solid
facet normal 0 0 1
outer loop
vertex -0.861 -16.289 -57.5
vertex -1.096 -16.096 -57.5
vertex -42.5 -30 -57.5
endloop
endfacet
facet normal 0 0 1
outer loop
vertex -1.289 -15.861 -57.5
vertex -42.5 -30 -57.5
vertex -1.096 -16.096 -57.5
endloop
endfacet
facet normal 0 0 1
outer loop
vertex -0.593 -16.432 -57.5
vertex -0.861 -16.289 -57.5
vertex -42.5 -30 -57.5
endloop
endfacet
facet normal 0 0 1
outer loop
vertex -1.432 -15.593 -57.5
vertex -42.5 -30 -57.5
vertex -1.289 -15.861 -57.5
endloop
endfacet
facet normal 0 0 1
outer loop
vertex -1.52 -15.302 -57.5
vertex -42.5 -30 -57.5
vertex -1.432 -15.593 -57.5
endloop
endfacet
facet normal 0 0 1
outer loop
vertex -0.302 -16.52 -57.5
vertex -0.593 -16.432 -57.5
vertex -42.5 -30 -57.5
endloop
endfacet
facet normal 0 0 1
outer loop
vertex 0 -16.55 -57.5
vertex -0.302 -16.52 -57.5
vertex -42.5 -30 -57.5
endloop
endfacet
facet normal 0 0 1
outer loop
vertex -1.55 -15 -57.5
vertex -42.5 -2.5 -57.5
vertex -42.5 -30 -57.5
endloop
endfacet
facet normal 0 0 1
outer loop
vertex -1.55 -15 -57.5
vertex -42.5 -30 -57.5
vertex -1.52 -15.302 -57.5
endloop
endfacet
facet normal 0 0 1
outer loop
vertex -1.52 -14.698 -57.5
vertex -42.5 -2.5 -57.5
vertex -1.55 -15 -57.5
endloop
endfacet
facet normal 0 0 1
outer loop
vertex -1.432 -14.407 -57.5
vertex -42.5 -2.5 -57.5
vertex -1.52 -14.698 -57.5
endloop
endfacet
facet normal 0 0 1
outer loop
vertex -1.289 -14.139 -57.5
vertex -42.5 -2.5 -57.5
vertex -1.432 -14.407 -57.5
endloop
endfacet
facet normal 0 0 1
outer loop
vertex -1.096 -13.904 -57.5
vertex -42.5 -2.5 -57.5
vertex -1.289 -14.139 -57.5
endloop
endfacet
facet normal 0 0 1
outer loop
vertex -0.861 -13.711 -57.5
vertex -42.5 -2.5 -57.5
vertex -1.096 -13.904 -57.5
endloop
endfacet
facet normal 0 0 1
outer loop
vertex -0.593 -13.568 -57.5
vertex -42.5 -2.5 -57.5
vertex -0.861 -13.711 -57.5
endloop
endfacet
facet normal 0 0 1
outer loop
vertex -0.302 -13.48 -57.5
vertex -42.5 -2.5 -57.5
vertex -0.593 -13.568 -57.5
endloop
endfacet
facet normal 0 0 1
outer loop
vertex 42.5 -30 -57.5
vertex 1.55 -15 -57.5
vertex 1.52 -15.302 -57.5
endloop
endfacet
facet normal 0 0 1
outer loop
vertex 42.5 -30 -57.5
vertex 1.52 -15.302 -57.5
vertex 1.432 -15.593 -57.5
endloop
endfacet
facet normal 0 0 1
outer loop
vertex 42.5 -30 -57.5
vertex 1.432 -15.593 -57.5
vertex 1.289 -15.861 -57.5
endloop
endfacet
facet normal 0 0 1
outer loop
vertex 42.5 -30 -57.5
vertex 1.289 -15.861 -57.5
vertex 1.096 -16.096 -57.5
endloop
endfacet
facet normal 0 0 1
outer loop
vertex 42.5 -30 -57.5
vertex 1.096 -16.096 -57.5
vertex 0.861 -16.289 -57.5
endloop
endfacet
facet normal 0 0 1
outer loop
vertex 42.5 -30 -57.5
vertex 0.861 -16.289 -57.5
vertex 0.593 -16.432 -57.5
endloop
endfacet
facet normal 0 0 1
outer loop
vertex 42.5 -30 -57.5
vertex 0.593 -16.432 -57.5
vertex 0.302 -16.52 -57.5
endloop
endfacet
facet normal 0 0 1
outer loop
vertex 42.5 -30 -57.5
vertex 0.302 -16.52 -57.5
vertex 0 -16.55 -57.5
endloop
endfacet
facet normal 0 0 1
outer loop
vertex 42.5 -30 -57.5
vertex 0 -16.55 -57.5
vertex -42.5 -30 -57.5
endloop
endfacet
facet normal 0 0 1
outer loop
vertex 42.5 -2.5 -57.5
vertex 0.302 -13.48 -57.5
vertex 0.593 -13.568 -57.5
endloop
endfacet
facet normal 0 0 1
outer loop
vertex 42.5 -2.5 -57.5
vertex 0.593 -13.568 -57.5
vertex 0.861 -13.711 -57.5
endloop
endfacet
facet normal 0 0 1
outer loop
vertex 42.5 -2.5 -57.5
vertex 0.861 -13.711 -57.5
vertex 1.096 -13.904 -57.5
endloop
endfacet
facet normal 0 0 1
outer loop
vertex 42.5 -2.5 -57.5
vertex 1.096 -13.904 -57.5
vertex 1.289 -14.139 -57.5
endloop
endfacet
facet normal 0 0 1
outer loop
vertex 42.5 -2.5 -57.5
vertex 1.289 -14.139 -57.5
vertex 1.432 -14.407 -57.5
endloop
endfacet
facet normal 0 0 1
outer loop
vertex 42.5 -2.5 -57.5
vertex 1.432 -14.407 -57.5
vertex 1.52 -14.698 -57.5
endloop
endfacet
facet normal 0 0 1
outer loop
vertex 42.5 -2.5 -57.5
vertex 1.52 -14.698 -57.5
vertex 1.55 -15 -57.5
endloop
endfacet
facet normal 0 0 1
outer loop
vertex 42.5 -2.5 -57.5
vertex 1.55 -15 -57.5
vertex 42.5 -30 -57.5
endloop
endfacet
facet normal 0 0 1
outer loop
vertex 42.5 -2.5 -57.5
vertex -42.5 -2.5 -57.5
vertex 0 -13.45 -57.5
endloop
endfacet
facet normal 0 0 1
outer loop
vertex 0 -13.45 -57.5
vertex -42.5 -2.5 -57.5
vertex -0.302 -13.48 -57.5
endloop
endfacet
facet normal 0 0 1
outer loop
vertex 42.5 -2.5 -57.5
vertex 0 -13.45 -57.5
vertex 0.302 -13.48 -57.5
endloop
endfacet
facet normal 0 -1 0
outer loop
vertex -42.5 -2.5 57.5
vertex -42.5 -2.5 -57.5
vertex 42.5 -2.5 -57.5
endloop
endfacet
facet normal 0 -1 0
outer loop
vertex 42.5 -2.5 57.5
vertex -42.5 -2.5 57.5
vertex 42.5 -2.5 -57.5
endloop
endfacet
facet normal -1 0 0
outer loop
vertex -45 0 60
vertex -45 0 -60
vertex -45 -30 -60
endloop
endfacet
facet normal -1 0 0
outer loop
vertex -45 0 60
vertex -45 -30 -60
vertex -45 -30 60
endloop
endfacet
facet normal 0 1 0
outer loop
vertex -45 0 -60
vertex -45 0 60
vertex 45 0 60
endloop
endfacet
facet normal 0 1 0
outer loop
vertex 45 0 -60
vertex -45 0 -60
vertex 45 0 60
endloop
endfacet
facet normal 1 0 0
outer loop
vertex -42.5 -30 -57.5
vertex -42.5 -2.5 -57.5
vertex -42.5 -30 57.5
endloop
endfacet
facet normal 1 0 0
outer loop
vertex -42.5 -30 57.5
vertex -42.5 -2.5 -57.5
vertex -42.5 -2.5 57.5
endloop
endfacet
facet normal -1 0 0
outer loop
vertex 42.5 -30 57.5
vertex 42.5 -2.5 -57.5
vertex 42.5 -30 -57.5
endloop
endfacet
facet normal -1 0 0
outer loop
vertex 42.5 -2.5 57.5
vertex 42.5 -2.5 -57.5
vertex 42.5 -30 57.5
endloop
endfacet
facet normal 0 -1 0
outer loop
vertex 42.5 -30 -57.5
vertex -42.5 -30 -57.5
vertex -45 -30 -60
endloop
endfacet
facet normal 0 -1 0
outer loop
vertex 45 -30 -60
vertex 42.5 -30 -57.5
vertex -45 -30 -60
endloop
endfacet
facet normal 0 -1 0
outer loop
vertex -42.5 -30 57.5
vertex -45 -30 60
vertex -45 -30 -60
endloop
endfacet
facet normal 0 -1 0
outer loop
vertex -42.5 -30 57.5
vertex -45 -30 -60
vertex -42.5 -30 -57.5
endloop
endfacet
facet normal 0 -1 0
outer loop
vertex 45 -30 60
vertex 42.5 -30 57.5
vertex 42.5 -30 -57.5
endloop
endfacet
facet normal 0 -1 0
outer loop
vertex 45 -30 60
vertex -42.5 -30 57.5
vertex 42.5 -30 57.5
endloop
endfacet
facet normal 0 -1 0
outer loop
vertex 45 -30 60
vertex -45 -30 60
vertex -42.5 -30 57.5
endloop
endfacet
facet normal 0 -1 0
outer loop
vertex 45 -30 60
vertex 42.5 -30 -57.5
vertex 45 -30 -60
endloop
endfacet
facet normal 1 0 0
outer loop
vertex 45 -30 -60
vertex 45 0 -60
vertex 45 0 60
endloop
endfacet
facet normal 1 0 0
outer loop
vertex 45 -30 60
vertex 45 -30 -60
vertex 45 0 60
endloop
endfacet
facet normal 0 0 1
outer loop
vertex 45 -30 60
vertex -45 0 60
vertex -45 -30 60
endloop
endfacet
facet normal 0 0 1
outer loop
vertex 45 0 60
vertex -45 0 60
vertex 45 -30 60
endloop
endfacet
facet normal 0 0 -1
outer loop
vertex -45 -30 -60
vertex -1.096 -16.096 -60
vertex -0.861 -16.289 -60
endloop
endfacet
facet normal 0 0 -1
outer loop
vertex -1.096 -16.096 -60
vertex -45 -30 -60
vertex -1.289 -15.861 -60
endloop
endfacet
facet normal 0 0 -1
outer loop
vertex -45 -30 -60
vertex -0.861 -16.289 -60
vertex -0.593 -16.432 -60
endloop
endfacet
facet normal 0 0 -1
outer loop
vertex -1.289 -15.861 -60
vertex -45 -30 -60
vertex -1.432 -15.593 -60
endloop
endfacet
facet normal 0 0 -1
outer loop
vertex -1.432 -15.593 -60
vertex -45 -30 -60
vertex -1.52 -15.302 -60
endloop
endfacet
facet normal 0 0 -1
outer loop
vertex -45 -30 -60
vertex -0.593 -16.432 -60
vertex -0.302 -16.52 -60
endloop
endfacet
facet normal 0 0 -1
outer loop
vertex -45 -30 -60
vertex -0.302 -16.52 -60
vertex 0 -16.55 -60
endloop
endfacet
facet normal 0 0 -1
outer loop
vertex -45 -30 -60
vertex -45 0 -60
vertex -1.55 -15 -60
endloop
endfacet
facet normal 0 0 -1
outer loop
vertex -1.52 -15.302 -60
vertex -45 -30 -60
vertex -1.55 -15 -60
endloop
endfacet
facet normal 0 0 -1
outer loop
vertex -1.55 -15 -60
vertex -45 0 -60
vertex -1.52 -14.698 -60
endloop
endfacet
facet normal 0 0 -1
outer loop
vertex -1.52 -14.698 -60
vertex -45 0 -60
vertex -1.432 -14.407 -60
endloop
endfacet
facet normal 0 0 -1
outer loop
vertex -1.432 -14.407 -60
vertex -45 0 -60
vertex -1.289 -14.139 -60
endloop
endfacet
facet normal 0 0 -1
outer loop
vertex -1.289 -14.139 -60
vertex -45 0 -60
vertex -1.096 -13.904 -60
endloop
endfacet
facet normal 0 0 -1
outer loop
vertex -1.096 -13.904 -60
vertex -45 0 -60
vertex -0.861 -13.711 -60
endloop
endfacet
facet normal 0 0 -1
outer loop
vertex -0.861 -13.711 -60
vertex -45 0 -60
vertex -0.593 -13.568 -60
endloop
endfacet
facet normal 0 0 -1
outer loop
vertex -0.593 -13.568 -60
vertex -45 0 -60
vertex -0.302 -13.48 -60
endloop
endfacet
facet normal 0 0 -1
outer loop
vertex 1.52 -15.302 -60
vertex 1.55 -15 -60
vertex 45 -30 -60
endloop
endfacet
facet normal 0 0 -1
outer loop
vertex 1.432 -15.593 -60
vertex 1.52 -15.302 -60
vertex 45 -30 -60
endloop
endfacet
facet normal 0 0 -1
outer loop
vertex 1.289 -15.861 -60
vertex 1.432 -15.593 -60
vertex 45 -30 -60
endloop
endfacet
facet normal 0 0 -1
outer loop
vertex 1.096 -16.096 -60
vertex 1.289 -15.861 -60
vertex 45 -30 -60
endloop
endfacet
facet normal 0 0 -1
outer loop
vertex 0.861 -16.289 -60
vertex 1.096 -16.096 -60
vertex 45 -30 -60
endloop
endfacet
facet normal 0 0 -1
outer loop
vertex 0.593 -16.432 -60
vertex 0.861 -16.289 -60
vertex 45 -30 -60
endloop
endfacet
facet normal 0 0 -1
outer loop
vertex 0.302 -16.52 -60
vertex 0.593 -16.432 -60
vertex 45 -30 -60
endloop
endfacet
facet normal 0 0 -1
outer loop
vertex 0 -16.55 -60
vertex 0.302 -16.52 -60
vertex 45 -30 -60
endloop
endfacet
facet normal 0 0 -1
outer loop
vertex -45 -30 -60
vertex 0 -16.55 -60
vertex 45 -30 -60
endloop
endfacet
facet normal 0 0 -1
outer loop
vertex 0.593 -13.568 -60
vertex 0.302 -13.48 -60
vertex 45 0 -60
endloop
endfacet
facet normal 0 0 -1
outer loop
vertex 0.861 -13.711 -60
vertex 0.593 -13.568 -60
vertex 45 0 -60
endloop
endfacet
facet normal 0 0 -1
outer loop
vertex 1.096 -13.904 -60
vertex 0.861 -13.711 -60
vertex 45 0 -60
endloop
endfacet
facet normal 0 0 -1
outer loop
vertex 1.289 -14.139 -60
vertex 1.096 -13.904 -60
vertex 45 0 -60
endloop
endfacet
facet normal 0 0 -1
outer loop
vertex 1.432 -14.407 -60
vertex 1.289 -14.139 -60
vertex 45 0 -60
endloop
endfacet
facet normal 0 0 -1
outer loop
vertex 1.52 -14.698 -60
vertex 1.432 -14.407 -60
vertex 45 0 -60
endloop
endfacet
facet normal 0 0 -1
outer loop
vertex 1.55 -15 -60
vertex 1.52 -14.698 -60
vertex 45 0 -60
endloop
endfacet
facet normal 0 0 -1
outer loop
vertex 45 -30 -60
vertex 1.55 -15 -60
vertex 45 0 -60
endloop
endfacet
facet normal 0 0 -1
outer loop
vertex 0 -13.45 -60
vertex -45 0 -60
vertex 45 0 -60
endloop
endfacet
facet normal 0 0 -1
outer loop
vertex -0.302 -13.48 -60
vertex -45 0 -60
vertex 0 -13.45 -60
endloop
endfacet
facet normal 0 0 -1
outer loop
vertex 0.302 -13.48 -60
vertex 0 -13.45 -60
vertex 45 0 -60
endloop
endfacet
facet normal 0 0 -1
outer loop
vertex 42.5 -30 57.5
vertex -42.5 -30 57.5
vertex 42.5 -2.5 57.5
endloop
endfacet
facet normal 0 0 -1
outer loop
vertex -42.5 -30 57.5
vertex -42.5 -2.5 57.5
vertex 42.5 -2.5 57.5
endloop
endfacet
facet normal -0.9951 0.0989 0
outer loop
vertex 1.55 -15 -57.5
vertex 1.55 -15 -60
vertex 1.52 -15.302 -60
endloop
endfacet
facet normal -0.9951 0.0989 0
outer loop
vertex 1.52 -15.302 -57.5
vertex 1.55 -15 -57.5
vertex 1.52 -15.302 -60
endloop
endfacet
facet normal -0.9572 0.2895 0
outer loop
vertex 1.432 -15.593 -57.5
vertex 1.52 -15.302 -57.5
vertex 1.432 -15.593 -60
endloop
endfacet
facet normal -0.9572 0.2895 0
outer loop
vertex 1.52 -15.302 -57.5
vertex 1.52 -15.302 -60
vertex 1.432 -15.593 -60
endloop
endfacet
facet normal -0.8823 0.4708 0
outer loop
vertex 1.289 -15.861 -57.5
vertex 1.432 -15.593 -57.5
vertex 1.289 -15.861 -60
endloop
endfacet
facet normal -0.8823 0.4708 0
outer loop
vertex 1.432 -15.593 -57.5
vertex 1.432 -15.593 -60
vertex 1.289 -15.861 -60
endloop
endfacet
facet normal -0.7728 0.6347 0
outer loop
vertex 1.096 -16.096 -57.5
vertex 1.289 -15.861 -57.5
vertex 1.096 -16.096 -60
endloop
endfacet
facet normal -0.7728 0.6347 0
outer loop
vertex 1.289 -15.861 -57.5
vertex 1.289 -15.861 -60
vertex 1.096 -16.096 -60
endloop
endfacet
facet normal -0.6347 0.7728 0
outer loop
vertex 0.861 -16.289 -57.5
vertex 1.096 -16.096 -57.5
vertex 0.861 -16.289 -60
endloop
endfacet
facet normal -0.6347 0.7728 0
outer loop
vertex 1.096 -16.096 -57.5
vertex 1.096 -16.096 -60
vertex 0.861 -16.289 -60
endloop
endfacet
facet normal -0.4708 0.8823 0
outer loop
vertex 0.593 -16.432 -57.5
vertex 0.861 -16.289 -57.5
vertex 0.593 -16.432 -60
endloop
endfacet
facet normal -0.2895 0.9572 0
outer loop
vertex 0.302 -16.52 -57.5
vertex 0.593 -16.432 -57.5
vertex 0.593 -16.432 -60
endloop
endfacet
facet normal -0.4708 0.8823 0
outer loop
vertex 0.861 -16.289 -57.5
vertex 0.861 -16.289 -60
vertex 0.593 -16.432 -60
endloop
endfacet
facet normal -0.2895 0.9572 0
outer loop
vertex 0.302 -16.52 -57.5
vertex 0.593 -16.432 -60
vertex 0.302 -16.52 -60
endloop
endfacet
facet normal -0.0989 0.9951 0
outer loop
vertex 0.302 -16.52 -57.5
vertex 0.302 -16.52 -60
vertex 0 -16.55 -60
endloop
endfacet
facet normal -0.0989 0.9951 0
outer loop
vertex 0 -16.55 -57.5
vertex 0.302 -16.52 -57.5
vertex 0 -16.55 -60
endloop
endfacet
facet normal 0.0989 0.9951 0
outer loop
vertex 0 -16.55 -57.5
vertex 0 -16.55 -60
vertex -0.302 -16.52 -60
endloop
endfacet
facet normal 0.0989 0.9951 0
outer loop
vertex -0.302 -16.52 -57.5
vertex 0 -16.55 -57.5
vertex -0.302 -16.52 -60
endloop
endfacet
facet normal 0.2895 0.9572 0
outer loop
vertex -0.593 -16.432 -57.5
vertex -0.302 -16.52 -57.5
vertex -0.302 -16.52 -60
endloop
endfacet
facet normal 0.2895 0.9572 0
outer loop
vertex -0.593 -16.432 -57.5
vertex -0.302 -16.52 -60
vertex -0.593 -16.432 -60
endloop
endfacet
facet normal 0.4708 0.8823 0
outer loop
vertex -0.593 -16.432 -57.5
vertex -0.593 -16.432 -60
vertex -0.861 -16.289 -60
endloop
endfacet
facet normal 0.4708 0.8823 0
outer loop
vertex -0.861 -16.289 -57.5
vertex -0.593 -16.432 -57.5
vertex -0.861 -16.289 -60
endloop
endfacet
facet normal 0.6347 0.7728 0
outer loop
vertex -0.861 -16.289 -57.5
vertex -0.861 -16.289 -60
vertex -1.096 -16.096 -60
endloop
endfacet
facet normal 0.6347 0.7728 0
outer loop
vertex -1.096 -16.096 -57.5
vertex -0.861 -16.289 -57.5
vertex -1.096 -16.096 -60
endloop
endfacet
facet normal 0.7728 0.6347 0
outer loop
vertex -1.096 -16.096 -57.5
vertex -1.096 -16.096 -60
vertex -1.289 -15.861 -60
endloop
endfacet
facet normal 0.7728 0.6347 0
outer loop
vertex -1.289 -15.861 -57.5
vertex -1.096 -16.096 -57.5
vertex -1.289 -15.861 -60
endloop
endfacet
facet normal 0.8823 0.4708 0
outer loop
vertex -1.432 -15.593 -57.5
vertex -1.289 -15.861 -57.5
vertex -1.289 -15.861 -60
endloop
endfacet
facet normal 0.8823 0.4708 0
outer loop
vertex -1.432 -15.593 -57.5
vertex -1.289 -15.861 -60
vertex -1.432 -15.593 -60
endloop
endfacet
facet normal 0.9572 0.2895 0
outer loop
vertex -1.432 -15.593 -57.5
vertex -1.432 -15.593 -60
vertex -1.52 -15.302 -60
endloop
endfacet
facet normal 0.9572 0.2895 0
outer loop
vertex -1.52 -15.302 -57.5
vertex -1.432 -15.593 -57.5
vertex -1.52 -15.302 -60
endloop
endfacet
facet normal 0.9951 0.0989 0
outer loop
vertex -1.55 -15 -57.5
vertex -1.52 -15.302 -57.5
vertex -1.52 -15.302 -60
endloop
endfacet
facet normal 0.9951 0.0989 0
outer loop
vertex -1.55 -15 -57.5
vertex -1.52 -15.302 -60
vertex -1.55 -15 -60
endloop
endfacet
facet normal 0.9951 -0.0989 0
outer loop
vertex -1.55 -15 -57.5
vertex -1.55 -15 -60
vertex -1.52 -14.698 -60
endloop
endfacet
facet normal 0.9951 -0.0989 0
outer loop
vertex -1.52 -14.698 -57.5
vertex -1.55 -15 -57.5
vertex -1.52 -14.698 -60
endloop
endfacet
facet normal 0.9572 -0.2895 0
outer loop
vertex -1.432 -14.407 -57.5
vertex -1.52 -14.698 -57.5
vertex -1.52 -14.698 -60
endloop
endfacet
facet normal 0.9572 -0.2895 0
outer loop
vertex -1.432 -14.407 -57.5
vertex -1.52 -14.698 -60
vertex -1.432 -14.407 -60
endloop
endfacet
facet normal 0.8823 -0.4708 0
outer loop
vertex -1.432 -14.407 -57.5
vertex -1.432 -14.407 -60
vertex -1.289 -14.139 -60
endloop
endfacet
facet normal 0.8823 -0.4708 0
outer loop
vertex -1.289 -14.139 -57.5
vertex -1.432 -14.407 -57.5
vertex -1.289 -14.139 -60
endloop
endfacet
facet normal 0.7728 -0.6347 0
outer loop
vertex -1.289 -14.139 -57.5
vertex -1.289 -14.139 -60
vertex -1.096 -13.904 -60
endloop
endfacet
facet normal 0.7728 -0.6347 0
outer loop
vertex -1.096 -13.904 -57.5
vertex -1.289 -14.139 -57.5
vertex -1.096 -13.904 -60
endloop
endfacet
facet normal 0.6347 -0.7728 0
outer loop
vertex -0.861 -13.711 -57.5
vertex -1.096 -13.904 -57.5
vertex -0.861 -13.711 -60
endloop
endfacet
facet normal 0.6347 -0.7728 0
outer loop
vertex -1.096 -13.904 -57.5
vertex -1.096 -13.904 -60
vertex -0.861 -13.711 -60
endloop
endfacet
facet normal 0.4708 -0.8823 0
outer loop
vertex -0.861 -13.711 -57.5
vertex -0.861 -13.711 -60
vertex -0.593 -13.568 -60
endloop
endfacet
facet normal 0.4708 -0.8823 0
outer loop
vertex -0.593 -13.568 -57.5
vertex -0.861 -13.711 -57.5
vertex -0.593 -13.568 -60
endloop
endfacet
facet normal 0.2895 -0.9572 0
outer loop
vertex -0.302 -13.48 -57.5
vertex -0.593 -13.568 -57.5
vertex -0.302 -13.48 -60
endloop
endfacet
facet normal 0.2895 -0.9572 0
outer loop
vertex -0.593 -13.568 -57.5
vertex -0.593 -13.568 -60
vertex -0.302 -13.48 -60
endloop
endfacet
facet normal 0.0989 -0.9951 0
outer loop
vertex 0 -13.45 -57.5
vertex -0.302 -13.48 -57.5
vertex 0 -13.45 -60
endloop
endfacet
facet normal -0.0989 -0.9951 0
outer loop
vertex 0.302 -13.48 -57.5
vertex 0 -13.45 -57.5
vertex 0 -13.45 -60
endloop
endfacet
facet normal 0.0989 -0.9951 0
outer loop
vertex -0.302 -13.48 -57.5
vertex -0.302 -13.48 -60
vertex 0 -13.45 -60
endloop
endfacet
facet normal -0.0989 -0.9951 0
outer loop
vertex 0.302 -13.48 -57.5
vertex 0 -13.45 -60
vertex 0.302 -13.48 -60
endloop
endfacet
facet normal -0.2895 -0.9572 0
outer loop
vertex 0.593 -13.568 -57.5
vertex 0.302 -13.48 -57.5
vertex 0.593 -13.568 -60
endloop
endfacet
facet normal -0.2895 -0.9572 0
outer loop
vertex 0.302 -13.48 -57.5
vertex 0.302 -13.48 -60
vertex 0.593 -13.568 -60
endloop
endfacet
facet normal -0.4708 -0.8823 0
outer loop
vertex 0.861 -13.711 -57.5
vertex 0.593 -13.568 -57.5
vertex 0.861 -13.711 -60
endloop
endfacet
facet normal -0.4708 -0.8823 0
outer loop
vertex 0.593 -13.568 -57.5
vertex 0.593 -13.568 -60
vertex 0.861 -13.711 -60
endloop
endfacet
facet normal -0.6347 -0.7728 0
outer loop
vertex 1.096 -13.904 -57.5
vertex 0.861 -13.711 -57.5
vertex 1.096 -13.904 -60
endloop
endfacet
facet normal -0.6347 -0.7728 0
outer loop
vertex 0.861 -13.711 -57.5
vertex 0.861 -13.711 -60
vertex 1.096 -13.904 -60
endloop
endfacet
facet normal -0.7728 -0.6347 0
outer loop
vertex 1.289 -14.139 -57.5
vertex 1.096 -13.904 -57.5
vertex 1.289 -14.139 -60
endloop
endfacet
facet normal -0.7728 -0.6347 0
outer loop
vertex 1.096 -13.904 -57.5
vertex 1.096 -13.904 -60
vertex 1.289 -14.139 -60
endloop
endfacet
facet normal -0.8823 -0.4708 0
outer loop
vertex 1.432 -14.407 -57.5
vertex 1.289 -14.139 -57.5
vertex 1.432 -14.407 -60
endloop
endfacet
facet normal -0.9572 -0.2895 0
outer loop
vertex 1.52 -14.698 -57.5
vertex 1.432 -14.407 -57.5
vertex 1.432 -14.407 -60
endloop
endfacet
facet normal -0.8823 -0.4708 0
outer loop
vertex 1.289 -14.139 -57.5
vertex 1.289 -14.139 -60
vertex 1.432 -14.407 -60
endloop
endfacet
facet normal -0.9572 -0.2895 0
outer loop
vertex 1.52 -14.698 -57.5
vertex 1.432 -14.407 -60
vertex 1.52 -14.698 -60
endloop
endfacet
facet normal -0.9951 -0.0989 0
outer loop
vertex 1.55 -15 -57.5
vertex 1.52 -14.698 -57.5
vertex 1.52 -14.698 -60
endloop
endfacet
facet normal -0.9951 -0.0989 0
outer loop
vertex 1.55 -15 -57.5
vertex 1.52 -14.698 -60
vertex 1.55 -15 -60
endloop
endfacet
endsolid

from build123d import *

# Parameters (mm, degrees)
F0_W     = 90
F0_H     = 120
F1_DEPTH = 30
F2_T     = -2.5
F3_R     = 1.55
F4_DEPTH = 25


with BuildPart() as f1:
    # F0 (on Front) → F1 (new body)
    with BuildSketch(Plane.XZ):
        Rectangle(F0_W, F0_H)
    extrude(amount=F1_DEPTH)

    # F2
    f2_openings = [f1.faces().sort_by_distance(p)[0] for p in [
        (0, -30, 0),
    ]]
    offset(amount=F2_T, openings=f2_openings)

    # F3 (on face) → F4 (cut)
    with BuildSketch(Plane(origin=(0, 0, -60), x_dir=(1, 0, 0), z_dir=(0, 0, -1))):
        with Locations((0, 15)):
            Circle(F3_R)
    extrude(amount=-F4_DEPTH, mode=Mode.SUBTRACT)


solid = f1.part
